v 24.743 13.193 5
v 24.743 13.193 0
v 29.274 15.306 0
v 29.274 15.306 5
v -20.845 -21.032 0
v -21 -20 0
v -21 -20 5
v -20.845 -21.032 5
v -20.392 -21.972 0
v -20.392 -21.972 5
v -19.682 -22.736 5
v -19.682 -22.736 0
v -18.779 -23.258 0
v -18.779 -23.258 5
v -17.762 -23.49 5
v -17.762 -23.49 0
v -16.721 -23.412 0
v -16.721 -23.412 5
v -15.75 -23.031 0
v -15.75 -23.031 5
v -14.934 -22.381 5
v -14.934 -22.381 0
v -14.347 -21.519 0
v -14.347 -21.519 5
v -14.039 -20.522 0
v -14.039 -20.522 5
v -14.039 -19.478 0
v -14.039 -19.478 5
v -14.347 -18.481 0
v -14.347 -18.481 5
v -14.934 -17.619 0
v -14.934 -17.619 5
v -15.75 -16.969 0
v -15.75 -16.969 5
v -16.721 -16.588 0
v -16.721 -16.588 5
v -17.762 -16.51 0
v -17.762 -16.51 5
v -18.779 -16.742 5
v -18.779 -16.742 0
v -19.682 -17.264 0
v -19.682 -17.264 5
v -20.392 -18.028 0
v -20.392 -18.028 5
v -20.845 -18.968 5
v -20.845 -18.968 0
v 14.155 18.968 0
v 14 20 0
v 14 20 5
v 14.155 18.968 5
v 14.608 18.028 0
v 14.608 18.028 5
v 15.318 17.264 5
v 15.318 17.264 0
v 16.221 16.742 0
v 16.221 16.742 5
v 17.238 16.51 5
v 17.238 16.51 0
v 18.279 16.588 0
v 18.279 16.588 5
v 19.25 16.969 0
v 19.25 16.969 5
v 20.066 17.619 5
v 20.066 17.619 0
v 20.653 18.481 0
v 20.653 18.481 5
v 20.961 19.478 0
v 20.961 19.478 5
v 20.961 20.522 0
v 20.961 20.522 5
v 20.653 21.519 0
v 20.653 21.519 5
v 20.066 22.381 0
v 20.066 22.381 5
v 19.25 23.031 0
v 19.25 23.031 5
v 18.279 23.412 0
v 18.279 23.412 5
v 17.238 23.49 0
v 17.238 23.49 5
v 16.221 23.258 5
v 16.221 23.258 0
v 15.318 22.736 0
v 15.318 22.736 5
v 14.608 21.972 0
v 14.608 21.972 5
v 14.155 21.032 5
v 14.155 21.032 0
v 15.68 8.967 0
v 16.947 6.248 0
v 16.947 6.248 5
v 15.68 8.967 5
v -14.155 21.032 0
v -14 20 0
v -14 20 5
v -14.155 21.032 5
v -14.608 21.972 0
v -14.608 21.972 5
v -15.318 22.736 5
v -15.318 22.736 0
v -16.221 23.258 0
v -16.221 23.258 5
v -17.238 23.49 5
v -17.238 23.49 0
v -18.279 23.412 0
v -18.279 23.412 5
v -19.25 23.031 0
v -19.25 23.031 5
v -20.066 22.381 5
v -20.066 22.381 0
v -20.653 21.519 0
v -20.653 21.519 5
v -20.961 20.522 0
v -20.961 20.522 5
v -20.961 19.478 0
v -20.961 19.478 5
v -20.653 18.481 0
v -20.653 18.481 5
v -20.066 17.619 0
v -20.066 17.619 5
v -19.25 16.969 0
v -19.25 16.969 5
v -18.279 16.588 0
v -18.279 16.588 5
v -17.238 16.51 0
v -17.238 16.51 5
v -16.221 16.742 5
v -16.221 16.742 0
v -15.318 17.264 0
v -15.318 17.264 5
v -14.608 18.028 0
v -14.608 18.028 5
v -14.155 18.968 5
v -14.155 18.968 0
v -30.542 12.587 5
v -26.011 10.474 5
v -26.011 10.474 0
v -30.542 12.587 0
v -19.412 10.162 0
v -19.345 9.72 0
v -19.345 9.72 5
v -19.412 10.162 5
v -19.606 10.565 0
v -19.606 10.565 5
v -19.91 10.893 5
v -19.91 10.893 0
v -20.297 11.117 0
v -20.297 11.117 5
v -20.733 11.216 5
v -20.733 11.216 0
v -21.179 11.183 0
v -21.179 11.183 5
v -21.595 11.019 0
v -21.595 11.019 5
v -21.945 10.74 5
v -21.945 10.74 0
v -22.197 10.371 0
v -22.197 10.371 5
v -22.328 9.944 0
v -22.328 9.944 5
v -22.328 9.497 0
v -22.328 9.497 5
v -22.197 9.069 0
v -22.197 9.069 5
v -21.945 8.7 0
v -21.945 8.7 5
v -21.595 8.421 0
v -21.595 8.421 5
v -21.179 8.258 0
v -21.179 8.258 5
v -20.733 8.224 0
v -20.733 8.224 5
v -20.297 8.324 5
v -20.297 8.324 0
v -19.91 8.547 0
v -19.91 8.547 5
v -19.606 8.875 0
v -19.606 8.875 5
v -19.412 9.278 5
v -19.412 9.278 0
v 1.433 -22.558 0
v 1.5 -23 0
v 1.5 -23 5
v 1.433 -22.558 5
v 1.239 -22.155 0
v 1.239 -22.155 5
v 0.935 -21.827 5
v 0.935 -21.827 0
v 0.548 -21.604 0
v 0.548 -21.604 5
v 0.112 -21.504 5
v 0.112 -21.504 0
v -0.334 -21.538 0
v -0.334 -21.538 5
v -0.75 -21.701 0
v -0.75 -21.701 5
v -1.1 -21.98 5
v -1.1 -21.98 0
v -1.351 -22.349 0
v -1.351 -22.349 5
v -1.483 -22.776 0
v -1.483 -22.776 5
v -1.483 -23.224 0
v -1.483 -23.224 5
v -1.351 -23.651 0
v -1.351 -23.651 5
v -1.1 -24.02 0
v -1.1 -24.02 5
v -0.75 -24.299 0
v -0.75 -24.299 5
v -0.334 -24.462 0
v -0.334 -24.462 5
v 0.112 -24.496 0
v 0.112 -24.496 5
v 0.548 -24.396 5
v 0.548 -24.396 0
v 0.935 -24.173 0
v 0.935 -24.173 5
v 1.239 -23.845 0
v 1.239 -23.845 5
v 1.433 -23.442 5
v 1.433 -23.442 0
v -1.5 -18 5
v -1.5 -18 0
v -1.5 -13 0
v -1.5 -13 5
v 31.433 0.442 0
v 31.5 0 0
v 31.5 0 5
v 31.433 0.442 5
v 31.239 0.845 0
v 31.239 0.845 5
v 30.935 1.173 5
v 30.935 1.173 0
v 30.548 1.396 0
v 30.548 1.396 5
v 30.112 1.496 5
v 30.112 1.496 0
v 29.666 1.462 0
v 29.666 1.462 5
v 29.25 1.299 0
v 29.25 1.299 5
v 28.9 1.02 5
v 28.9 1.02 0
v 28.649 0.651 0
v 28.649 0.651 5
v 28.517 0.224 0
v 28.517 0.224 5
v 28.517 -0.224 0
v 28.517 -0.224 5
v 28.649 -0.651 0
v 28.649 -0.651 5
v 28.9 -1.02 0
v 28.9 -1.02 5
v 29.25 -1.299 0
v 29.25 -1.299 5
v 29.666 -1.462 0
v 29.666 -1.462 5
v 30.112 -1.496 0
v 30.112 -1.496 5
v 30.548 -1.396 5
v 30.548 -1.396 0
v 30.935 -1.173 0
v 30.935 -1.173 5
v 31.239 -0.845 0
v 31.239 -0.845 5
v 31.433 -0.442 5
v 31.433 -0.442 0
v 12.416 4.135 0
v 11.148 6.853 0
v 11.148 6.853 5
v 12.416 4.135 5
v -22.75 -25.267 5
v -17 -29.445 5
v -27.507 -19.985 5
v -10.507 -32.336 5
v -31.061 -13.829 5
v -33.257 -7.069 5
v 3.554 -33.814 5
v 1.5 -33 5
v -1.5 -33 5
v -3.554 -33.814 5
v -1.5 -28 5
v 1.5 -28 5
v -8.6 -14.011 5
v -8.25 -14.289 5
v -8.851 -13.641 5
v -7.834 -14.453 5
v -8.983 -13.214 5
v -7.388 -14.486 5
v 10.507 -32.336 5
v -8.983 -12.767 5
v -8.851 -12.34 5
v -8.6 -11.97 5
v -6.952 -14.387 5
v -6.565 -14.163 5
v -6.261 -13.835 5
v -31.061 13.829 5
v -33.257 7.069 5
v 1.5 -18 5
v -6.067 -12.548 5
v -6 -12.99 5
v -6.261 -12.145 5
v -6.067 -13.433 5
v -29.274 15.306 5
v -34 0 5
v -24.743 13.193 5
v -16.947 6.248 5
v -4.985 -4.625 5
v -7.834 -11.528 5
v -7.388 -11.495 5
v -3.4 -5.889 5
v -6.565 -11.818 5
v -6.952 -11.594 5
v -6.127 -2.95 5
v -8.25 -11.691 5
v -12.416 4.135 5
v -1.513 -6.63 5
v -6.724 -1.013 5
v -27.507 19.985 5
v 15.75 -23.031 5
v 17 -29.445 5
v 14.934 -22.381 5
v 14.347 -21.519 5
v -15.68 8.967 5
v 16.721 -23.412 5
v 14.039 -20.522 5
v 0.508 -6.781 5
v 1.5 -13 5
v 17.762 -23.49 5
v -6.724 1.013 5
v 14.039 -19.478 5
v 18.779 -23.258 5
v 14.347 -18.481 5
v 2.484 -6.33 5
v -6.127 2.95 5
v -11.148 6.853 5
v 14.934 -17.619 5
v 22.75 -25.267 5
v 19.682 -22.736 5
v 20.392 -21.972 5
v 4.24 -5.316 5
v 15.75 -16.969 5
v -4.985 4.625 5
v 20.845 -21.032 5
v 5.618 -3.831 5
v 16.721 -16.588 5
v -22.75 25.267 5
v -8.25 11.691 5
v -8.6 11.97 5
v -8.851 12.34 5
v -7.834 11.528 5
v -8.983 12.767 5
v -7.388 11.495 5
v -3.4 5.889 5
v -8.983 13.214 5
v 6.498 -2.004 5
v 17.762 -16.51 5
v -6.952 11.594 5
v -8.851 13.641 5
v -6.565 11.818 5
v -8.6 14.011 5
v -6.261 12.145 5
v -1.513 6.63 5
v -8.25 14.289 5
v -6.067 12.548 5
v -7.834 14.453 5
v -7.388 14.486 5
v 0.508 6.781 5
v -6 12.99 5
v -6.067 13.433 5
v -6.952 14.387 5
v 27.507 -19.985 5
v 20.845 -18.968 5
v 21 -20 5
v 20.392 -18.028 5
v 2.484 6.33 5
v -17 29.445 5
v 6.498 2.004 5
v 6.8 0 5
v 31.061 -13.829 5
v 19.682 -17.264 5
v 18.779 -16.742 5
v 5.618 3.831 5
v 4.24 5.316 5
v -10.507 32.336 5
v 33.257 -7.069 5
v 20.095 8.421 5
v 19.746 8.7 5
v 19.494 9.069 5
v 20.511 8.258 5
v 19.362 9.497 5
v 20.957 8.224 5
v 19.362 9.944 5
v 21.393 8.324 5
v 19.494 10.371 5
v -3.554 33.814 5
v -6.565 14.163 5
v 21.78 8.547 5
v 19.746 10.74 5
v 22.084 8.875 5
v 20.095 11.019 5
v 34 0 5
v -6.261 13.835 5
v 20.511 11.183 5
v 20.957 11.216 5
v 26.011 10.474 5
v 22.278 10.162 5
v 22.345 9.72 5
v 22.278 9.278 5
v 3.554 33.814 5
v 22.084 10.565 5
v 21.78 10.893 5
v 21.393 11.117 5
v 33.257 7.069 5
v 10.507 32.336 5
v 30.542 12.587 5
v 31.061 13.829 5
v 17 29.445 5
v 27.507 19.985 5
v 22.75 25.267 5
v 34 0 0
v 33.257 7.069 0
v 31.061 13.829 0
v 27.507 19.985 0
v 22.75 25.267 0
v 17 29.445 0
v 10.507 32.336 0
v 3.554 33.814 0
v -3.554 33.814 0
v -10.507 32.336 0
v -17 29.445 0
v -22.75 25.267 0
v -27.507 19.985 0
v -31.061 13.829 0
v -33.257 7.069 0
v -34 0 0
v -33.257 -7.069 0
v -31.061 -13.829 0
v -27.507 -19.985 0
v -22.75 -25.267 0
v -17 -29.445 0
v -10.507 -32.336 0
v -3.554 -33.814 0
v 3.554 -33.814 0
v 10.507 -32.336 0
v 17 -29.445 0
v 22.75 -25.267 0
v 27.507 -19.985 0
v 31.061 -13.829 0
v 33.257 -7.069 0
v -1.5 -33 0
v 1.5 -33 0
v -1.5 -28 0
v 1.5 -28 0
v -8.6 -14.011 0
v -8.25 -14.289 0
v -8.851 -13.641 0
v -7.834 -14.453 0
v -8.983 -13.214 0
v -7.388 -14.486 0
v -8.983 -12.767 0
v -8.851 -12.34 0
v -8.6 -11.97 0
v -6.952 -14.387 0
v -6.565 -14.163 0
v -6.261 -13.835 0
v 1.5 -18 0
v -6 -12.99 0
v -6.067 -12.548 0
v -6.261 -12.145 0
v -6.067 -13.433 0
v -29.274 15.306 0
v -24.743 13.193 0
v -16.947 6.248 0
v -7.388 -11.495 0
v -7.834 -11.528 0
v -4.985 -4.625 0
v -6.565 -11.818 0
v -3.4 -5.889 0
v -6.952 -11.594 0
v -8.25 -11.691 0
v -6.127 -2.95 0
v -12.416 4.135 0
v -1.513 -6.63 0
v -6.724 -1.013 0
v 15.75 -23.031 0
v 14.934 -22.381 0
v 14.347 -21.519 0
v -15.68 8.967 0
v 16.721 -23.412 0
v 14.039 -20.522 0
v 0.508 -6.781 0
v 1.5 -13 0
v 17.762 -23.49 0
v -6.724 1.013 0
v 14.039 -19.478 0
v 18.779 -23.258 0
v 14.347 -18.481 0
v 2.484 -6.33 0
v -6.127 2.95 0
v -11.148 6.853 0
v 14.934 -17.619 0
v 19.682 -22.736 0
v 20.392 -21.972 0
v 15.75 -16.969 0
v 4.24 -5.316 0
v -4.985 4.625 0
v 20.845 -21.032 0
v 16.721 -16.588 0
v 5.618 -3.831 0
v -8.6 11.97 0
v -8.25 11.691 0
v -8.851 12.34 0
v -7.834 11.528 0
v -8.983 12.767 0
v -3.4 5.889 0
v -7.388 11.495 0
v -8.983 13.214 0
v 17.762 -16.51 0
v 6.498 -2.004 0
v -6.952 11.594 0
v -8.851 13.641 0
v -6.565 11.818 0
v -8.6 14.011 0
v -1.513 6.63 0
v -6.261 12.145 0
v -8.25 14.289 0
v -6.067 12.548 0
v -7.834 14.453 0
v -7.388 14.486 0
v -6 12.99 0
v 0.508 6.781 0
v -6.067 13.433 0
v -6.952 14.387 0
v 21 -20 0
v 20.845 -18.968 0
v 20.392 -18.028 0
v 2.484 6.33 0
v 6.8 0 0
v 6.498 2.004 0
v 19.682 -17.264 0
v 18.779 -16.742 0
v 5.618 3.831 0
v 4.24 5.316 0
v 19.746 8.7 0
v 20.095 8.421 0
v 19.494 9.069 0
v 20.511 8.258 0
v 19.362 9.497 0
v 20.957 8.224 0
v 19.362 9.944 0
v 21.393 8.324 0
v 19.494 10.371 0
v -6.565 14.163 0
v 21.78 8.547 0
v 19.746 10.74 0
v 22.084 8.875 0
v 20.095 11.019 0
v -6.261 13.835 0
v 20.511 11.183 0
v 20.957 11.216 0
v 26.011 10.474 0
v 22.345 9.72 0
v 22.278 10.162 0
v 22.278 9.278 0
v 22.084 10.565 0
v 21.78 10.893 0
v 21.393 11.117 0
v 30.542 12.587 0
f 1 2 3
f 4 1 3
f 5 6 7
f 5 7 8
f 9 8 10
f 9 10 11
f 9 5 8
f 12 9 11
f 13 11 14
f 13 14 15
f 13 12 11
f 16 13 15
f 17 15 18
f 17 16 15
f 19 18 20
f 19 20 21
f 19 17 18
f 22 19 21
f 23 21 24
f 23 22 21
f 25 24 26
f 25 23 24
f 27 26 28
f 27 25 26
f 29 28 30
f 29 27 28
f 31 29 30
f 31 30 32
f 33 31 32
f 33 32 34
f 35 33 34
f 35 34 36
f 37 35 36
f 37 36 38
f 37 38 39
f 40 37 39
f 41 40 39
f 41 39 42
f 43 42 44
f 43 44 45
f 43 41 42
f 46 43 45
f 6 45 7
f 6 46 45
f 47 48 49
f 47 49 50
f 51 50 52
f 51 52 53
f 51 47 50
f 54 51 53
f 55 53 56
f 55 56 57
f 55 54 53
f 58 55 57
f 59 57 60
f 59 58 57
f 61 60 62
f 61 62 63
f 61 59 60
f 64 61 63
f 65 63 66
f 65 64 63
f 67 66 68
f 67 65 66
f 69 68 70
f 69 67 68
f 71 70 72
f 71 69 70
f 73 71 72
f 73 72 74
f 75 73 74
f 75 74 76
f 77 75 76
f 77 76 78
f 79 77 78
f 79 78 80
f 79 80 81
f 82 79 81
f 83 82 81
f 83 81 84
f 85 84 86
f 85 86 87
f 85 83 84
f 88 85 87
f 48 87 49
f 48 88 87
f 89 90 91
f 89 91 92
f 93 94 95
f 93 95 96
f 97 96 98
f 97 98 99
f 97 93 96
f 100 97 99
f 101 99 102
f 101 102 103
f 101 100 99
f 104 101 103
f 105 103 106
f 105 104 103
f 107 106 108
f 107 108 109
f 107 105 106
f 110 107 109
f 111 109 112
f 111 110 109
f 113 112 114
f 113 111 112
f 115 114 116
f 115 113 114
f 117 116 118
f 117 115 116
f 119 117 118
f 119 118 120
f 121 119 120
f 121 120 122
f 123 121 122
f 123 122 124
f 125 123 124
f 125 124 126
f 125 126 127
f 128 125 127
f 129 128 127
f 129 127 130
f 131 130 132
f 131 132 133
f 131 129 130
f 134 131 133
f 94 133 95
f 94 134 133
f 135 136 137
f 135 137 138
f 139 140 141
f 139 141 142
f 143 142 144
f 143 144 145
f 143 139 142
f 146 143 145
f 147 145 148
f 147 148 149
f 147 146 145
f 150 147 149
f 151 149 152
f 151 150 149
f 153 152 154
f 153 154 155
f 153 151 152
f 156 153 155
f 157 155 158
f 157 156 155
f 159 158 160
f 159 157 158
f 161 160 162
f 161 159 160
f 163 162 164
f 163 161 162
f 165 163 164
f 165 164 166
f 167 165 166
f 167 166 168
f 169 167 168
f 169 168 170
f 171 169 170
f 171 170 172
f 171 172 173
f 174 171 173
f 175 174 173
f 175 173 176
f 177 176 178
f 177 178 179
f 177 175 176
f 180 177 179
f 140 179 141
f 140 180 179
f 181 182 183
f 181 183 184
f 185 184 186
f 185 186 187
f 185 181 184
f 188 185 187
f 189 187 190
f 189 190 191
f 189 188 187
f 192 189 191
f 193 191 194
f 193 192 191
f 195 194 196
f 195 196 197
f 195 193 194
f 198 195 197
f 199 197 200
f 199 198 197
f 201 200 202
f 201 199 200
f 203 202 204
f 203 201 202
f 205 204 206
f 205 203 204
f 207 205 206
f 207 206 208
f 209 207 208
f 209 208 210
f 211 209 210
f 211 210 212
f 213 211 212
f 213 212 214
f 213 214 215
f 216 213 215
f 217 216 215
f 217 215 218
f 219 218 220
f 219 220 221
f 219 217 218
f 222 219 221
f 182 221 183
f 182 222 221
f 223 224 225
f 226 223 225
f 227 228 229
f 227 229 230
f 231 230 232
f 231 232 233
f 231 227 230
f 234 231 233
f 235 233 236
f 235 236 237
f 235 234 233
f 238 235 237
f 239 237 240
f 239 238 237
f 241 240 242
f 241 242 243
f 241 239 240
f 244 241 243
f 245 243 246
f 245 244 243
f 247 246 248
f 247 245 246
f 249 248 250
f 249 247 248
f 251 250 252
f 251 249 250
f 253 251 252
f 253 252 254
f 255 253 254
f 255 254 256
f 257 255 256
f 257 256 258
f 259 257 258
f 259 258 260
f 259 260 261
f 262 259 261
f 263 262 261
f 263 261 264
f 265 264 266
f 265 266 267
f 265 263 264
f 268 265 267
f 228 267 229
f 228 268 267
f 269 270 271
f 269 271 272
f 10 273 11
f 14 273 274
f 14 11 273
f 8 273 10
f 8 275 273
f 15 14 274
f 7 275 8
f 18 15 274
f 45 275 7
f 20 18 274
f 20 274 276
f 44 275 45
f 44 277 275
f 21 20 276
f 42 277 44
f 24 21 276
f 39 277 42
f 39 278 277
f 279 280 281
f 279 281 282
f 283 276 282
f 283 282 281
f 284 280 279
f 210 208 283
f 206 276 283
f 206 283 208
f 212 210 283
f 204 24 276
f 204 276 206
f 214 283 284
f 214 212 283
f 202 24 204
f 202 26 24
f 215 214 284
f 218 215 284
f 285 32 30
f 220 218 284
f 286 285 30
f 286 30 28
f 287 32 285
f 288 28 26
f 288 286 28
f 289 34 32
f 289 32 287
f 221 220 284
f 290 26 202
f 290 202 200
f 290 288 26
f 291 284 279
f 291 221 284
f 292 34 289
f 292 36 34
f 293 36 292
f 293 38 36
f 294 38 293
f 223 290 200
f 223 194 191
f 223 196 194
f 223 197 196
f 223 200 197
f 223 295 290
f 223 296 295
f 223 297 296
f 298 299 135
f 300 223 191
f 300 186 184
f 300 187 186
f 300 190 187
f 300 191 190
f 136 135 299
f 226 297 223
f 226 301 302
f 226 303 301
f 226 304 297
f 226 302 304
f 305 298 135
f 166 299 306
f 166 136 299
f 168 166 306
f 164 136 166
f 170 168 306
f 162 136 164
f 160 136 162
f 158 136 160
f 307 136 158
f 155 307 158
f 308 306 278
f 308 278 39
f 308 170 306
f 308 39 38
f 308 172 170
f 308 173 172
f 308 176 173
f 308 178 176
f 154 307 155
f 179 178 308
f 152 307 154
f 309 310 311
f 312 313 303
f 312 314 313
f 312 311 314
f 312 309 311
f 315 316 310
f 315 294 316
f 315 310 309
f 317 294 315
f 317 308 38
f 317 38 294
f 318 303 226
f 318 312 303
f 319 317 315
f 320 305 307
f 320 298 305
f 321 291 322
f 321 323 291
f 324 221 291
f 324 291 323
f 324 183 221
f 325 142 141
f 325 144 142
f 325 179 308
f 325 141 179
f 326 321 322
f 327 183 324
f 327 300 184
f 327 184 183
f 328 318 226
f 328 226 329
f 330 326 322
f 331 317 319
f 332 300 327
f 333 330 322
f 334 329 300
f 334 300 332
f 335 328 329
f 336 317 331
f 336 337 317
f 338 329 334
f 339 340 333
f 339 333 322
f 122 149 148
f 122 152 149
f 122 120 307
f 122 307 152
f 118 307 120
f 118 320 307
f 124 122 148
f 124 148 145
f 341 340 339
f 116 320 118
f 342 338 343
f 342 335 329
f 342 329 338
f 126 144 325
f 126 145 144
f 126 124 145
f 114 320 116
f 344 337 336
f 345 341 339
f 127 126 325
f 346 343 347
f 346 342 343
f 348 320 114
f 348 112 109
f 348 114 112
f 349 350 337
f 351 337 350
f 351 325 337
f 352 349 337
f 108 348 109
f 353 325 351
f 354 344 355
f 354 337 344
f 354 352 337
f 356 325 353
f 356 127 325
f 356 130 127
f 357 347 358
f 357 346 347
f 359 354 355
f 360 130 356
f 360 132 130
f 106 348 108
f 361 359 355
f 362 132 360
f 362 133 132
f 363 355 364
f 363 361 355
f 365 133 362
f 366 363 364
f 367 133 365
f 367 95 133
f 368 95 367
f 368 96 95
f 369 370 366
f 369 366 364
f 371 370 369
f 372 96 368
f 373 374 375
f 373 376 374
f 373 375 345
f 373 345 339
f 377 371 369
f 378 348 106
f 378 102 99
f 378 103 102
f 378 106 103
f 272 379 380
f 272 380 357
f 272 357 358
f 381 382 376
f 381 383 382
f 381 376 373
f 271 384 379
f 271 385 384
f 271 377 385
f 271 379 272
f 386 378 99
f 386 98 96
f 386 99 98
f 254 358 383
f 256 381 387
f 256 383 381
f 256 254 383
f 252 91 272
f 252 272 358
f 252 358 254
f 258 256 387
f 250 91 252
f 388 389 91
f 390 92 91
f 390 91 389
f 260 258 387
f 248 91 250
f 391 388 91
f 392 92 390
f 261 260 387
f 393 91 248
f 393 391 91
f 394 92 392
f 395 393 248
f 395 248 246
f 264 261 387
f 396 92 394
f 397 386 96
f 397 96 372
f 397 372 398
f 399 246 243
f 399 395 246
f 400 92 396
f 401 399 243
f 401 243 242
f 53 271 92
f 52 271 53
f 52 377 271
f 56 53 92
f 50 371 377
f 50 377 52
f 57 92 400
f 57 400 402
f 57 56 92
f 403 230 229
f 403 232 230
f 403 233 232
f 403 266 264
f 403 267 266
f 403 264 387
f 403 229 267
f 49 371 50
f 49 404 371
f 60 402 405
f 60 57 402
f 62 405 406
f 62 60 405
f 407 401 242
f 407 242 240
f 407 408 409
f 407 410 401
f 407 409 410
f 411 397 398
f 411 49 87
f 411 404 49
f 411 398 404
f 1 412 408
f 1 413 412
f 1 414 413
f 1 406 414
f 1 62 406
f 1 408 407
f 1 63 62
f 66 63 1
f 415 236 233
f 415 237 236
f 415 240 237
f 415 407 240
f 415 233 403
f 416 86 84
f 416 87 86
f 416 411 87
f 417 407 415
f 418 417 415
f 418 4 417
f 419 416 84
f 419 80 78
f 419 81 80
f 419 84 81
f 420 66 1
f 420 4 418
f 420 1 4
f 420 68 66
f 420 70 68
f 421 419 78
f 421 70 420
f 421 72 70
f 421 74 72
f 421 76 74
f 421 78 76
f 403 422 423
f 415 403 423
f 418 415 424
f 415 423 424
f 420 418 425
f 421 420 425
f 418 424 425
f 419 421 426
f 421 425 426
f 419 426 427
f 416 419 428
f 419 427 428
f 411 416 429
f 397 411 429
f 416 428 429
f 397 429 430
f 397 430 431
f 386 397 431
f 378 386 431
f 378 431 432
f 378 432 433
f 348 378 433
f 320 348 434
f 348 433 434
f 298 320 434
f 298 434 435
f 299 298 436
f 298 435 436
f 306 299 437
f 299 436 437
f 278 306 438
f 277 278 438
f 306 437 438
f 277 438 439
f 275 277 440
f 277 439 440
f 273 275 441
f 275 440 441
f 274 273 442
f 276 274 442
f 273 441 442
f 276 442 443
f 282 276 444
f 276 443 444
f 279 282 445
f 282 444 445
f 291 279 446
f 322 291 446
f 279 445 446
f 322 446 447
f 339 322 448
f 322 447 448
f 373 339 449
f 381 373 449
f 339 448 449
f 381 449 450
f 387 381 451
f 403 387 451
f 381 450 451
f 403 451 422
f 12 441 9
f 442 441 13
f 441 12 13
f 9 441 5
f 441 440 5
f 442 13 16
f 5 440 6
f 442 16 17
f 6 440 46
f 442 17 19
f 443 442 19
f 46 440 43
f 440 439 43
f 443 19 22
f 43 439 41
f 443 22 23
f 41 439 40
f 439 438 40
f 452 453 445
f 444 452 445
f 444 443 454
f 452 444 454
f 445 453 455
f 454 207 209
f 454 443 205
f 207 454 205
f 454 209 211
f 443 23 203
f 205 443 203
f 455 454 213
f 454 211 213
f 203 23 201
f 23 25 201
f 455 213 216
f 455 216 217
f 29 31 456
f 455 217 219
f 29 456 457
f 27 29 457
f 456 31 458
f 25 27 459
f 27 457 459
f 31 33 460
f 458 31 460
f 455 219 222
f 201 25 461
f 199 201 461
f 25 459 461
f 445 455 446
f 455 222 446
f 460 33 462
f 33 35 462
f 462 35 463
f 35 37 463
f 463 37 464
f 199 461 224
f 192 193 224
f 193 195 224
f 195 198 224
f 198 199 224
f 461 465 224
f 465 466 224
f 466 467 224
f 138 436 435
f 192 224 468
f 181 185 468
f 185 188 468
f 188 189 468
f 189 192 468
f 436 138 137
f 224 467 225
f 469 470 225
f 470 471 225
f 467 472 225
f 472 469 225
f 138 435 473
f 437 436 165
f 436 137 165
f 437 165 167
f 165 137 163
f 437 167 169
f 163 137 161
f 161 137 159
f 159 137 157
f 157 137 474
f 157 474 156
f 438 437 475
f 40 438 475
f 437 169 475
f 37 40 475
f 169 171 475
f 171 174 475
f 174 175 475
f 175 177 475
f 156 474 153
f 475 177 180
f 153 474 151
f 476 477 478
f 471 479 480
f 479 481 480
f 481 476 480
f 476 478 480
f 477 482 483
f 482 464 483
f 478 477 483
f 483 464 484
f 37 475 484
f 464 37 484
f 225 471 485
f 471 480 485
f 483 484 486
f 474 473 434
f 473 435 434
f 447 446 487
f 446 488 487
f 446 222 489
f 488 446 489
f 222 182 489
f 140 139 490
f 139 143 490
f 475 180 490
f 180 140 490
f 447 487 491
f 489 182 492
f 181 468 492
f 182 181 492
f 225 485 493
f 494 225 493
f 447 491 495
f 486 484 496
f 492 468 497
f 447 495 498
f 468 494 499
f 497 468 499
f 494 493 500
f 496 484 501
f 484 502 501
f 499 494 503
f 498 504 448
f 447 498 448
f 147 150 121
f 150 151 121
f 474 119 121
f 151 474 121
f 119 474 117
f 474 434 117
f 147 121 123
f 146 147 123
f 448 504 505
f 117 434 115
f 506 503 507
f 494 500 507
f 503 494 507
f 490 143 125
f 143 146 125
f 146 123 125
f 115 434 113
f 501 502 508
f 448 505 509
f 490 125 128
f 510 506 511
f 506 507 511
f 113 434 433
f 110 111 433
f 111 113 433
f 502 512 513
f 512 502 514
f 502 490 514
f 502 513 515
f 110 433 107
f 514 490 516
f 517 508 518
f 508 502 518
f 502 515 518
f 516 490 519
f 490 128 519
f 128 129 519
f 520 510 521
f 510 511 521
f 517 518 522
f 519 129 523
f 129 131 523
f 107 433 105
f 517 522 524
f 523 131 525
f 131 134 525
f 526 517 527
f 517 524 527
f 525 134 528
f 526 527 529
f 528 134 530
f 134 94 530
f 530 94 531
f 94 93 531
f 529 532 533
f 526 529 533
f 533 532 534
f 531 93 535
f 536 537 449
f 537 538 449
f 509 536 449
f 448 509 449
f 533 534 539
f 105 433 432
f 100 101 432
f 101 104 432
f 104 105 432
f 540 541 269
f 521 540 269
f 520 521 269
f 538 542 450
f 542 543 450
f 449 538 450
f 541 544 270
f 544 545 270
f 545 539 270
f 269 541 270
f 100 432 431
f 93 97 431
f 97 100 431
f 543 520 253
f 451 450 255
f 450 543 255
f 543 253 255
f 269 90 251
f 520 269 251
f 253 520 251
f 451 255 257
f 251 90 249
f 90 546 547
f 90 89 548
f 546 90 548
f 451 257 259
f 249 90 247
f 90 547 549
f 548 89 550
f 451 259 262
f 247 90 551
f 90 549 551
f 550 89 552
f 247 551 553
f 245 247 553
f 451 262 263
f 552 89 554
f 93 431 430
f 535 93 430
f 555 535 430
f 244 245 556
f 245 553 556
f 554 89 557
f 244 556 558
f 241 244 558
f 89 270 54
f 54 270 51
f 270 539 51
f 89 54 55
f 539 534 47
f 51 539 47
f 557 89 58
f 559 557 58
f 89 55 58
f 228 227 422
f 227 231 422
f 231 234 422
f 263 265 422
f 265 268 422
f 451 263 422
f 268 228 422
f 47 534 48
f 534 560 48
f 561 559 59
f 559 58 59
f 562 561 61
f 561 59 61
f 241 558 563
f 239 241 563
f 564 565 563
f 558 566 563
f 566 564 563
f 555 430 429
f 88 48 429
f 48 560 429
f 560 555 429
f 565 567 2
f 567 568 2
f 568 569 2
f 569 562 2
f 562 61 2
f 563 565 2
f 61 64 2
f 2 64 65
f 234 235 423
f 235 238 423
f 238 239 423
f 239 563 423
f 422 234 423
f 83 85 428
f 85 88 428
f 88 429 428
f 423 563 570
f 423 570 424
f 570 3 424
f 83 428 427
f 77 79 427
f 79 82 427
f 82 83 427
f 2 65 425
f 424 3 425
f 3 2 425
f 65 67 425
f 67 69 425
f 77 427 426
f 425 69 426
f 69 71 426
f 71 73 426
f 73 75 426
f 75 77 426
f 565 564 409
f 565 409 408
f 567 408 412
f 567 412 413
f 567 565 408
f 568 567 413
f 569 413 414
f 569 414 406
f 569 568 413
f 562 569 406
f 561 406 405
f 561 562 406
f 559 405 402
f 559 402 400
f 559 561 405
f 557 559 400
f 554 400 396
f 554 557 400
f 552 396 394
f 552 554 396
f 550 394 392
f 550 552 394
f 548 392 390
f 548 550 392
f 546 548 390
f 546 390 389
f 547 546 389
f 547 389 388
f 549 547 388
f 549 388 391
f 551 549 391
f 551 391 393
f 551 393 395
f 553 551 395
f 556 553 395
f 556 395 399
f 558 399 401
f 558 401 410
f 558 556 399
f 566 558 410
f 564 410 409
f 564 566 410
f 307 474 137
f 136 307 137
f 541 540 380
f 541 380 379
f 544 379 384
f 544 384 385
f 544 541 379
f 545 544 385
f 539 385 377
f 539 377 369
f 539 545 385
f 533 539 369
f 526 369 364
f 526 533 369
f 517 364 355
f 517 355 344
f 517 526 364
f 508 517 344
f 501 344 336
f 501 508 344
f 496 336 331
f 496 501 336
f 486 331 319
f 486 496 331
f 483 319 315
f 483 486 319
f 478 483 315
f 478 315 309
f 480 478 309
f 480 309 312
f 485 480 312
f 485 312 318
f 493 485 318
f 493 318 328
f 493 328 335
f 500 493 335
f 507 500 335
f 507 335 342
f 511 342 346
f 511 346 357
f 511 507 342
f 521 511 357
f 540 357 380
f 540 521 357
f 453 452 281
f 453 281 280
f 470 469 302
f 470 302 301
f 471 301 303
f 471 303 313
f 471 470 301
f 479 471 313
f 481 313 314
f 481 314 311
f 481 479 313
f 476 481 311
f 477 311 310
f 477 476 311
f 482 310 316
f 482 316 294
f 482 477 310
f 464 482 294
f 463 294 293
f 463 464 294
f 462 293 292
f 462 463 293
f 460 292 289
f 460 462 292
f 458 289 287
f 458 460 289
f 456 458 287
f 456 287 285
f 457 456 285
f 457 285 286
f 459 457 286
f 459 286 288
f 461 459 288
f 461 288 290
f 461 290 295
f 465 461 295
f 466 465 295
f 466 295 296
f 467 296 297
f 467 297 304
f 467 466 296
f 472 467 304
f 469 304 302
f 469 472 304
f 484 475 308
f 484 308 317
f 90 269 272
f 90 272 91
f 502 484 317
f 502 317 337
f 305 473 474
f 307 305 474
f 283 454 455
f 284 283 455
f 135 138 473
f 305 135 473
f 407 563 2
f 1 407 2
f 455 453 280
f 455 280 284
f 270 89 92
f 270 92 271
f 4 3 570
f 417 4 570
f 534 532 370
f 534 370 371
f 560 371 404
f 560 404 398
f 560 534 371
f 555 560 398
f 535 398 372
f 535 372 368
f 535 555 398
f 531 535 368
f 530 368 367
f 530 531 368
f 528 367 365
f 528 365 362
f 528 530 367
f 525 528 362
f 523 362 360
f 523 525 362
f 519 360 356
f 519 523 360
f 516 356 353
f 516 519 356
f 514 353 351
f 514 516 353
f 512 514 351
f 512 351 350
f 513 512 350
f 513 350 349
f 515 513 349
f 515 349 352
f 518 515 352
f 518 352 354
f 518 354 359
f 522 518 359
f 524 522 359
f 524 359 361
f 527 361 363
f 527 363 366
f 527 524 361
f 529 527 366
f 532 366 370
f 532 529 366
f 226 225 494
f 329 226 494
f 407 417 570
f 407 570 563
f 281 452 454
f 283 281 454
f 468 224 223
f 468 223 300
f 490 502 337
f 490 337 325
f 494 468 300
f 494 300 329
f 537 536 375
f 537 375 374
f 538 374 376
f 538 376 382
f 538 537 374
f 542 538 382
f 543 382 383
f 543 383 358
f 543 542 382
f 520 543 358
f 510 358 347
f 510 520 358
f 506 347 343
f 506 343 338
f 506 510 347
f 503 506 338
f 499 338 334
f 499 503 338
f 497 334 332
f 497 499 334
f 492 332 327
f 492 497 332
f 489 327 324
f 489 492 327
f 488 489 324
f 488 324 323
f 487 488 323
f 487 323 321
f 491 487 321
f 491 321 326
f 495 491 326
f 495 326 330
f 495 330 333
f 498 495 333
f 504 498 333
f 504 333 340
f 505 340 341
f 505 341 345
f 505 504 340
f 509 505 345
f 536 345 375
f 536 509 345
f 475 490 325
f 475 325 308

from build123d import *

# Parameters (mm, degrees)
SKETCH1_R           = 34
SKETCH1_R_2         = 1.5
SKETCH1_R_3         = 6.8
SKETCH1_R_4         = 3.5
SKETCH1_W           = 3
SKETCH1_H           = 5
BOSS_EXTRUDE1_DEPTH = 5


with BuildPart() as part:
    # Sketch1 → Boss-Extrude1 (new body)
    with BuildSketch(Plane.XY):
        Circle(SKETCH1_R)
        with Locations((30, 0)):
            Circle(SKETCH1_R_2, mode=Mode.SUBTRACT)
        with Locations((-7.5, -12.990381057)):
            Circle(SKETCH1_R_2, mode=Mode.SUBTRACT)
        with Locations((-7.5, 12.990381057)):
            Circle(SKETCH1_R_2, mode=Mode.SUBTRACT)
        Circle(SKETCH1_R_3, mode=Mode.SUBTRACT)
        with Locations((-17.5, 20)):
            Circle(SKETCH1_R_4, mode=Mode.SUBTRACT)
        with Locations(Location((17.5, 20, 0), (0, 0, 180))):
            Circle(SKETCH1_R_4, mode=Mode.SUBTRACT)
        with Locations(Location((-17.5, -20, 0), (0, 0, 180))):
            Circle(SKETCH1_R_4, mode=Mode.SUBTRACT)
        with Locations((17.5, -20)):
            Circle(SKETCH1_R_4, mode=Mode.SUBTRACT)
        with Locations((20.845079102, 9.72022002)):
            Circle(SKETCH1_R_2, mode=Mode.SUBTRACT)
        with Locations((-20.845079102, 9.72022002)):
            Circle(SKETCH1_R_2, mode=Mode.SUBTRACT)
        with Locations((0, -23)):
            Circle(SKETCH1_R_2, mode=Mode.SUBTRACT)
        Polygon((15.679612774, 8.966590392), (11.148073839, 6.853499083), (12.415928624, 4.134575722), (16.947467559, 6.247667031), align=None, mode=Mode.SUBTRACT)
        Polygon((24.742690644, 13.192773009), (29.27422958, 15.305864318), (30.542084365, 12.586940957), (26.01054543, 10.473849648), align=None, mode=Mode.SUBTRACT)
        Polygon((-16.947467559, 6.247667031), (-12.415928624, 4.134575722), (-11.148073839, 6.853499083), (-15.679612774, 8.966590392), align=None, mode=Mode.SUBTRACT)
        Polygon((-26.01054543, 10.473849648), (-30.542084365, 12.586940957), (-29.27422958, 15.305864318), (-24.742690644, 13.192773009), align=None, mode=Mode.SUBTRACT)
        with Locations((0, -30.5)):
            Rectangle(SKETCH1_W, SKETCH1_H, mode=Mode.SUBTRACT)
        with Locations((0, -15.5)):
            Rectangle(SKETCH1_W, SKETCH1_H, mode=Mode.SUBTRACT)
    extrude(amount=BOSS_EXTRUDE1_DEPTH)


solid = part.part
